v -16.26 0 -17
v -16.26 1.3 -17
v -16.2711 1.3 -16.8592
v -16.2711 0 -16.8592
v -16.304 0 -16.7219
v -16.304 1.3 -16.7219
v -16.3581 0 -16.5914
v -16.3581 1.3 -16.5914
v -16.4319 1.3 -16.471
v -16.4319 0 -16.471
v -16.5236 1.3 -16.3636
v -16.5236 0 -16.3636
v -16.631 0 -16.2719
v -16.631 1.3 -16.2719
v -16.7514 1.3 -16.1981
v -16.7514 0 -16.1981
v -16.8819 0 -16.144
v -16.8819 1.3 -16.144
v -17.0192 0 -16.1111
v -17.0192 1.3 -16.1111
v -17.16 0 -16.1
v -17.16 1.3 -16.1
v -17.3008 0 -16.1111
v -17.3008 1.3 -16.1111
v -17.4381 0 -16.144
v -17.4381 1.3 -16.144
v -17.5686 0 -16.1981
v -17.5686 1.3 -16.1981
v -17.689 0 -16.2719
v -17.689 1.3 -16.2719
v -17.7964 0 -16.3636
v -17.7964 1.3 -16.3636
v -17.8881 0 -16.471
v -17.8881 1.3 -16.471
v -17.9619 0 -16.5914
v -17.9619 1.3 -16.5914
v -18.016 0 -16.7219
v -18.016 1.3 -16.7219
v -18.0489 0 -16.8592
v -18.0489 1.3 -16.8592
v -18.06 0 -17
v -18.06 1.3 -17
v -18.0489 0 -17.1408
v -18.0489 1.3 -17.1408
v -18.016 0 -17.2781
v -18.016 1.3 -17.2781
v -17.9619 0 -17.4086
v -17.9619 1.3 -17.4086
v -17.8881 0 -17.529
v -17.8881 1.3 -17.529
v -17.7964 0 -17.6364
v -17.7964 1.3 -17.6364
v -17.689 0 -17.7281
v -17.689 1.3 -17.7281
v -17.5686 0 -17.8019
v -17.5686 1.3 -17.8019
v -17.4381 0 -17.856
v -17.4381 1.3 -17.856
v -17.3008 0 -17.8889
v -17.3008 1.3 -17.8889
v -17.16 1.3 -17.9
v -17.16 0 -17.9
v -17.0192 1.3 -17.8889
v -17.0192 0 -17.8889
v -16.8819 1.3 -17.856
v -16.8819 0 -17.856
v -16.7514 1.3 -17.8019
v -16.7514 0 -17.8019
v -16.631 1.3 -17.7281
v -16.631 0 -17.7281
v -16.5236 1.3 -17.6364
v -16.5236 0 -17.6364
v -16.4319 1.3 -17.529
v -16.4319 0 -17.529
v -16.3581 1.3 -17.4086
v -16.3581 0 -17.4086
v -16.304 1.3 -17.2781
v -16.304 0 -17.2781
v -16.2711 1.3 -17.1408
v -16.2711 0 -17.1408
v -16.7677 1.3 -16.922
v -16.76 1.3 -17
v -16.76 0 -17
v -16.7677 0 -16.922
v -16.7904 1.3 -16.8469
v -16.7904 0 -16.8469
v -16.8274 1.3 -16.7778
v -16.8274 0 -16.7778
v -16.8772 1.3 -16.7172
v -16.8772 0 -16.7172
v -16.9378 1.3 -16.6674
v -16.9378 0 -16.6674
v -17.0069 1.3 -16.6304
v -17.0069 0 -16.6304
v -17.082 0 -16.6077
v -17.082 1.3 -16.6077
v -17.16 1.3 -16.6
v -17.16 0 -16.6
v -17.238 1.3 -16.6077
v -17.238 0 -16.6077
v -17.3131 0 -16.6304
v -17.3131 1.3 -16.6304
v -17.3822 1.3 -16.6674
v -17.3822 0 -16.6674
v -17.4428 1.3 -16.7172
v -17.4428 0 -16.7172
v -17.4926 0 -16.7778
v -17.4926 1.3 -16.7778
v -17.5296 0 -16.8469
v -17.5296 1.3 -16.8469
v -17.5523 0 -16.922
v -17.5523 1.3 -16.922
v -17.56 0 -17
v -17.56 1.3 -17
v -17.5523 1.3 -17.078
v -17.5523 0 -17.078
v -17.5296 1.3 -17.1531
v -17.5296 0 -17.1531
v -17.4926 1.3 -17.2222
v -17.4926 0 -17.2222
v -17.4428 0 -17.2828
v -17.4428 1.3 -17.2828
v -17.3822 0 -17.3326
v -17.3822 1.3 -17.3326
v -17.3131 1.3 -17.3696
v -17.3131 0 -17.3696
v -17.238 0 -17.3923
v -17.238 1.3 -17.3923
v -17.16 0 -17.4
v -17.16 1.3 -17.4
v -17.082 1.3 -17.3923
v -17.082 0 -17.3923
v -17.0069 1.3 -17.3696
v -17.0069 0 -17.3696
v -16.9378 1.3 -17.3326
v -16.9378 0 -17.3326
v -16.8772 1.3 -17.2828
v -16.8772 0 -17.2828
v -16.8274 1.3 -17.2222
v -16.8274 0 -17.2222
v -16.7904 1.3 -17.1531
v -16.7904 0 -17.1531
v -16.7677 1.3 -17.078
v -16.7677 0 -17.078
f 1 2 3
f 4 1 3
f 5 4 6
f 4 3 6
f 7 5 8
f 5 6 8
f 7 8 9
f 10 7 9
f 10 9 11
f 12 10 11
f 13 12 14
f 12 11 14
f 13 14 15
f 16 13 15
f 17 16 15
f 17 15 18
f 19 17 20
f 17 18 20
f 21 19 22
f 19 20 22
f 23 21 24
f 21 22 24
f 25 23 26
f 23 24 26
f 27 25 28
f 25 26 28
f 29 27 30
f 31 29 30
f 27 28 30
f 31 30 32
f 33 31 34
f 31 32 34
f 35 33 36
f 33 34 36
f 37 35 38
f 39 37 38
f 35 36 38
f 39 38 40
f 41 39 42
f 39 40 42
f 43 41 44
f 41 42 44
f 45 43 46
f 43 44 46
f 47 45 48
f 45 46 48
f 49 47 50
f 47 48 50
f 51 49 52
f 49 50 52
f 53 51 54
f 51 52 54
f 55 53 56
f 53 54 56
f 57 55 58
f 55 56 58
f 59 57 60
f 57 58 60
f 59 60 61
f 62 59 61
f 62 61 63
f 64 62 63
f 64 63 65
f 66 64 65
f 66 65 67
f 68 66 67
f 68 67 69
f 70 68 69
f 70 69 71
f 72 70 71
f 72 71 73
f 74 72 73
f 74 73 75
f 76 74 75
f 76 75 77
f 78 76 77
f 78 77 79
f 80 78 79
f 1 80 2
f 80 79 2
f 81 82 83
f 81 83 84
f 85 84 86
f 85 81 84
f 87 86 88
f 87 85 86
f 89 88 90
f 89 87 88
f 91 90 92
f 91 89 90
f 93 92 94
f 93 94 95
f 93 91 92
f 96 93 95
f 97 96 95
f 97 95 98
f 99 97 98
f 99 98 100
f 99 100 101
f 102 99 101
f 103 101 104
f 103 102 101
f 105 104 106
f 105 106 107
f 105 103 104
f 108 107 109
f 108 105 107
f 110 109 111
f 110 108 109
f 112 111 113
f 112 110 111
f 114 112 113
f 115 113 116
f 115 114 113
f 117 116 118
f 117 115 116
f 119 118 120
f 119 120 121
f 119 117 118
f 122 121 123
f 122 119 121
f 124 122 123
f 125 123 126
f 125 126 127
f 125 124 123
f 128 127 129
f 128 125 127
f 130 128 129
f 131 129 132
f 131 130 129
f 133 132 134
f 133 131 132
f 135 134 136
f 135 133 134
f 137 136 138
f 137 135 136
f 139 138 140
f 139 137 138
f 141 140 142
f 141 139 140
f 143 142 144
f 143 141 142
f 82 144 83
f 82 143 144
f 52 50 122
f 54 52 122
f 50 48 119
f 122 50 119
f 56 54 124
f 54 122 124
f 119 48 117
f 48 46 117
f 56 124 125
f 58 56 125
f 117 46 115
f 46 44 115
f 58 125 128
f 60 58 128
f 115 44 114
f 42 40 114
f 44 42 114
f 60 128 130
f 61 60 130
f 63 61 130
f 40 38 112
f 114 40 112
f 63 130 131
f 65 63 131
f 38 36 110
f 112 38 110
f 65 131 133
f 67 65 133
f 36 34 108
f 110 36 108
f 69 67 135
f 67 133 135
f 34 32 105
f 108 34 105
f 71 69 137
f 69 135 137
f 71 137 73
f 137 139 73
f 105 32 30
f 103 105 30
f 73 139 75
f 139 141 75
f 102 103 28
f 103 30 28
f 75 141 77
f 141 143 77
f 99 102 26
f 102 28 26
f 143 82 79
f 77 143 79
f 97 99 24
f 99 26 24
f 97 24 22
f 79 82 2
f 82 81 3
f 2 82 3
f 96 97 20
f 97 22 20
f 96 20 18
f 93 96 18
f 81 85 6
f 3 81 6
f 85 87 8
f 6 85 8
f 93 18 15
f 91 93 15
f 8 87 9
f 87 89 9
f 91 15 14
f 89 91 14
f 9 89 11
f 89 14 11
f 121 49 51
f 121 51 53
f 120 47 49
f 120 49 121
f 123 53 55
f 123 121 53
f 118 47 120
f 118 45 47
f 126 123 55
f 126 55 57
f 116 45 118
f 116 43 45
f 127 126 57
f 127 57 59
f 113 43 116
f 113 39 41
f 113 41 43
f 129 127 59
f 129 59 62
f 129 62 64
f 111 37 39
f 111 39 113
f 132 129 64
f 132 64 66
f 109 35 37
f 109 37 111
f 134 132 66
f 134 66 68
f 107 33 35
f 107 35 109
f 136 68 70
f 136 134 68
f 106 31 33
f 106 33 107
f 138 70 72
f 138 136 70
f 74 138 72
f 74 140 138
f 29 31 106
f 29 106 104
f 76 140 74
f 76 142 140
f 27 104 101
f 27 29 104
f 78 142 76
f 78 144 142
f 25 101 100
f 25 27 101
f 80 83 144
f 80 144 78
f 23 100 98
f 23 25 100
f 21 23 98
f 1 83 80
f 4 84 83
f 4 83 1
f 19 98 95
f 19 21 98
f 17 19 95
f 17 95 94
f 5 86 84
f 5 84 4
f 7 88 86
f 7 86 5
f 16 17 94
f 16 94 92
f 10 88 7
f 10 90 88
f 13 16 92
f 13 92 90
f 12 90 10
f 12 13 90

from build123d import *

# Parameters (mm, degrees)
CYLINDER178_R          = 0.4
CYLINDER178_DEPTH      = 1.3
CYLINDER179_R          = 0.9
CYLINDER179_DEPTH      = 1.3
CUT119_PLACEMENT_ANGLE = 90


with BuildPart() as cylinder178:
    # Cylinder178 → Cylinder178 (new body)
    with BuildSketch(Plane.XY):
        Circle(CYLINDER178_R)
    extrude(amount=CYLINDER178_DEPTH)


with BuildPart() as contact004:
    # Cylinder179 → Cylinder179 (new body)
    with BuildSketch(Plane.XY):
        Circle(CYLINDER179_R)
    extrude(amount=CYLINDER179_DEPTH)

    # Cut119: cut Cylinder178
    add(cylinder178.part, mode=Mode.SUBTRACT)


with BuildPart() as contact004_1:
    # Cut119 placement: moved
    add(contact004.part.moved(Location((-17.16, 1.3, -17))).rotate(Axis((-17.16, 1.3, -17), (1, 0, 0)), CUT119_PLACEMENT_ANGLE))


solid = contact004_1.part
